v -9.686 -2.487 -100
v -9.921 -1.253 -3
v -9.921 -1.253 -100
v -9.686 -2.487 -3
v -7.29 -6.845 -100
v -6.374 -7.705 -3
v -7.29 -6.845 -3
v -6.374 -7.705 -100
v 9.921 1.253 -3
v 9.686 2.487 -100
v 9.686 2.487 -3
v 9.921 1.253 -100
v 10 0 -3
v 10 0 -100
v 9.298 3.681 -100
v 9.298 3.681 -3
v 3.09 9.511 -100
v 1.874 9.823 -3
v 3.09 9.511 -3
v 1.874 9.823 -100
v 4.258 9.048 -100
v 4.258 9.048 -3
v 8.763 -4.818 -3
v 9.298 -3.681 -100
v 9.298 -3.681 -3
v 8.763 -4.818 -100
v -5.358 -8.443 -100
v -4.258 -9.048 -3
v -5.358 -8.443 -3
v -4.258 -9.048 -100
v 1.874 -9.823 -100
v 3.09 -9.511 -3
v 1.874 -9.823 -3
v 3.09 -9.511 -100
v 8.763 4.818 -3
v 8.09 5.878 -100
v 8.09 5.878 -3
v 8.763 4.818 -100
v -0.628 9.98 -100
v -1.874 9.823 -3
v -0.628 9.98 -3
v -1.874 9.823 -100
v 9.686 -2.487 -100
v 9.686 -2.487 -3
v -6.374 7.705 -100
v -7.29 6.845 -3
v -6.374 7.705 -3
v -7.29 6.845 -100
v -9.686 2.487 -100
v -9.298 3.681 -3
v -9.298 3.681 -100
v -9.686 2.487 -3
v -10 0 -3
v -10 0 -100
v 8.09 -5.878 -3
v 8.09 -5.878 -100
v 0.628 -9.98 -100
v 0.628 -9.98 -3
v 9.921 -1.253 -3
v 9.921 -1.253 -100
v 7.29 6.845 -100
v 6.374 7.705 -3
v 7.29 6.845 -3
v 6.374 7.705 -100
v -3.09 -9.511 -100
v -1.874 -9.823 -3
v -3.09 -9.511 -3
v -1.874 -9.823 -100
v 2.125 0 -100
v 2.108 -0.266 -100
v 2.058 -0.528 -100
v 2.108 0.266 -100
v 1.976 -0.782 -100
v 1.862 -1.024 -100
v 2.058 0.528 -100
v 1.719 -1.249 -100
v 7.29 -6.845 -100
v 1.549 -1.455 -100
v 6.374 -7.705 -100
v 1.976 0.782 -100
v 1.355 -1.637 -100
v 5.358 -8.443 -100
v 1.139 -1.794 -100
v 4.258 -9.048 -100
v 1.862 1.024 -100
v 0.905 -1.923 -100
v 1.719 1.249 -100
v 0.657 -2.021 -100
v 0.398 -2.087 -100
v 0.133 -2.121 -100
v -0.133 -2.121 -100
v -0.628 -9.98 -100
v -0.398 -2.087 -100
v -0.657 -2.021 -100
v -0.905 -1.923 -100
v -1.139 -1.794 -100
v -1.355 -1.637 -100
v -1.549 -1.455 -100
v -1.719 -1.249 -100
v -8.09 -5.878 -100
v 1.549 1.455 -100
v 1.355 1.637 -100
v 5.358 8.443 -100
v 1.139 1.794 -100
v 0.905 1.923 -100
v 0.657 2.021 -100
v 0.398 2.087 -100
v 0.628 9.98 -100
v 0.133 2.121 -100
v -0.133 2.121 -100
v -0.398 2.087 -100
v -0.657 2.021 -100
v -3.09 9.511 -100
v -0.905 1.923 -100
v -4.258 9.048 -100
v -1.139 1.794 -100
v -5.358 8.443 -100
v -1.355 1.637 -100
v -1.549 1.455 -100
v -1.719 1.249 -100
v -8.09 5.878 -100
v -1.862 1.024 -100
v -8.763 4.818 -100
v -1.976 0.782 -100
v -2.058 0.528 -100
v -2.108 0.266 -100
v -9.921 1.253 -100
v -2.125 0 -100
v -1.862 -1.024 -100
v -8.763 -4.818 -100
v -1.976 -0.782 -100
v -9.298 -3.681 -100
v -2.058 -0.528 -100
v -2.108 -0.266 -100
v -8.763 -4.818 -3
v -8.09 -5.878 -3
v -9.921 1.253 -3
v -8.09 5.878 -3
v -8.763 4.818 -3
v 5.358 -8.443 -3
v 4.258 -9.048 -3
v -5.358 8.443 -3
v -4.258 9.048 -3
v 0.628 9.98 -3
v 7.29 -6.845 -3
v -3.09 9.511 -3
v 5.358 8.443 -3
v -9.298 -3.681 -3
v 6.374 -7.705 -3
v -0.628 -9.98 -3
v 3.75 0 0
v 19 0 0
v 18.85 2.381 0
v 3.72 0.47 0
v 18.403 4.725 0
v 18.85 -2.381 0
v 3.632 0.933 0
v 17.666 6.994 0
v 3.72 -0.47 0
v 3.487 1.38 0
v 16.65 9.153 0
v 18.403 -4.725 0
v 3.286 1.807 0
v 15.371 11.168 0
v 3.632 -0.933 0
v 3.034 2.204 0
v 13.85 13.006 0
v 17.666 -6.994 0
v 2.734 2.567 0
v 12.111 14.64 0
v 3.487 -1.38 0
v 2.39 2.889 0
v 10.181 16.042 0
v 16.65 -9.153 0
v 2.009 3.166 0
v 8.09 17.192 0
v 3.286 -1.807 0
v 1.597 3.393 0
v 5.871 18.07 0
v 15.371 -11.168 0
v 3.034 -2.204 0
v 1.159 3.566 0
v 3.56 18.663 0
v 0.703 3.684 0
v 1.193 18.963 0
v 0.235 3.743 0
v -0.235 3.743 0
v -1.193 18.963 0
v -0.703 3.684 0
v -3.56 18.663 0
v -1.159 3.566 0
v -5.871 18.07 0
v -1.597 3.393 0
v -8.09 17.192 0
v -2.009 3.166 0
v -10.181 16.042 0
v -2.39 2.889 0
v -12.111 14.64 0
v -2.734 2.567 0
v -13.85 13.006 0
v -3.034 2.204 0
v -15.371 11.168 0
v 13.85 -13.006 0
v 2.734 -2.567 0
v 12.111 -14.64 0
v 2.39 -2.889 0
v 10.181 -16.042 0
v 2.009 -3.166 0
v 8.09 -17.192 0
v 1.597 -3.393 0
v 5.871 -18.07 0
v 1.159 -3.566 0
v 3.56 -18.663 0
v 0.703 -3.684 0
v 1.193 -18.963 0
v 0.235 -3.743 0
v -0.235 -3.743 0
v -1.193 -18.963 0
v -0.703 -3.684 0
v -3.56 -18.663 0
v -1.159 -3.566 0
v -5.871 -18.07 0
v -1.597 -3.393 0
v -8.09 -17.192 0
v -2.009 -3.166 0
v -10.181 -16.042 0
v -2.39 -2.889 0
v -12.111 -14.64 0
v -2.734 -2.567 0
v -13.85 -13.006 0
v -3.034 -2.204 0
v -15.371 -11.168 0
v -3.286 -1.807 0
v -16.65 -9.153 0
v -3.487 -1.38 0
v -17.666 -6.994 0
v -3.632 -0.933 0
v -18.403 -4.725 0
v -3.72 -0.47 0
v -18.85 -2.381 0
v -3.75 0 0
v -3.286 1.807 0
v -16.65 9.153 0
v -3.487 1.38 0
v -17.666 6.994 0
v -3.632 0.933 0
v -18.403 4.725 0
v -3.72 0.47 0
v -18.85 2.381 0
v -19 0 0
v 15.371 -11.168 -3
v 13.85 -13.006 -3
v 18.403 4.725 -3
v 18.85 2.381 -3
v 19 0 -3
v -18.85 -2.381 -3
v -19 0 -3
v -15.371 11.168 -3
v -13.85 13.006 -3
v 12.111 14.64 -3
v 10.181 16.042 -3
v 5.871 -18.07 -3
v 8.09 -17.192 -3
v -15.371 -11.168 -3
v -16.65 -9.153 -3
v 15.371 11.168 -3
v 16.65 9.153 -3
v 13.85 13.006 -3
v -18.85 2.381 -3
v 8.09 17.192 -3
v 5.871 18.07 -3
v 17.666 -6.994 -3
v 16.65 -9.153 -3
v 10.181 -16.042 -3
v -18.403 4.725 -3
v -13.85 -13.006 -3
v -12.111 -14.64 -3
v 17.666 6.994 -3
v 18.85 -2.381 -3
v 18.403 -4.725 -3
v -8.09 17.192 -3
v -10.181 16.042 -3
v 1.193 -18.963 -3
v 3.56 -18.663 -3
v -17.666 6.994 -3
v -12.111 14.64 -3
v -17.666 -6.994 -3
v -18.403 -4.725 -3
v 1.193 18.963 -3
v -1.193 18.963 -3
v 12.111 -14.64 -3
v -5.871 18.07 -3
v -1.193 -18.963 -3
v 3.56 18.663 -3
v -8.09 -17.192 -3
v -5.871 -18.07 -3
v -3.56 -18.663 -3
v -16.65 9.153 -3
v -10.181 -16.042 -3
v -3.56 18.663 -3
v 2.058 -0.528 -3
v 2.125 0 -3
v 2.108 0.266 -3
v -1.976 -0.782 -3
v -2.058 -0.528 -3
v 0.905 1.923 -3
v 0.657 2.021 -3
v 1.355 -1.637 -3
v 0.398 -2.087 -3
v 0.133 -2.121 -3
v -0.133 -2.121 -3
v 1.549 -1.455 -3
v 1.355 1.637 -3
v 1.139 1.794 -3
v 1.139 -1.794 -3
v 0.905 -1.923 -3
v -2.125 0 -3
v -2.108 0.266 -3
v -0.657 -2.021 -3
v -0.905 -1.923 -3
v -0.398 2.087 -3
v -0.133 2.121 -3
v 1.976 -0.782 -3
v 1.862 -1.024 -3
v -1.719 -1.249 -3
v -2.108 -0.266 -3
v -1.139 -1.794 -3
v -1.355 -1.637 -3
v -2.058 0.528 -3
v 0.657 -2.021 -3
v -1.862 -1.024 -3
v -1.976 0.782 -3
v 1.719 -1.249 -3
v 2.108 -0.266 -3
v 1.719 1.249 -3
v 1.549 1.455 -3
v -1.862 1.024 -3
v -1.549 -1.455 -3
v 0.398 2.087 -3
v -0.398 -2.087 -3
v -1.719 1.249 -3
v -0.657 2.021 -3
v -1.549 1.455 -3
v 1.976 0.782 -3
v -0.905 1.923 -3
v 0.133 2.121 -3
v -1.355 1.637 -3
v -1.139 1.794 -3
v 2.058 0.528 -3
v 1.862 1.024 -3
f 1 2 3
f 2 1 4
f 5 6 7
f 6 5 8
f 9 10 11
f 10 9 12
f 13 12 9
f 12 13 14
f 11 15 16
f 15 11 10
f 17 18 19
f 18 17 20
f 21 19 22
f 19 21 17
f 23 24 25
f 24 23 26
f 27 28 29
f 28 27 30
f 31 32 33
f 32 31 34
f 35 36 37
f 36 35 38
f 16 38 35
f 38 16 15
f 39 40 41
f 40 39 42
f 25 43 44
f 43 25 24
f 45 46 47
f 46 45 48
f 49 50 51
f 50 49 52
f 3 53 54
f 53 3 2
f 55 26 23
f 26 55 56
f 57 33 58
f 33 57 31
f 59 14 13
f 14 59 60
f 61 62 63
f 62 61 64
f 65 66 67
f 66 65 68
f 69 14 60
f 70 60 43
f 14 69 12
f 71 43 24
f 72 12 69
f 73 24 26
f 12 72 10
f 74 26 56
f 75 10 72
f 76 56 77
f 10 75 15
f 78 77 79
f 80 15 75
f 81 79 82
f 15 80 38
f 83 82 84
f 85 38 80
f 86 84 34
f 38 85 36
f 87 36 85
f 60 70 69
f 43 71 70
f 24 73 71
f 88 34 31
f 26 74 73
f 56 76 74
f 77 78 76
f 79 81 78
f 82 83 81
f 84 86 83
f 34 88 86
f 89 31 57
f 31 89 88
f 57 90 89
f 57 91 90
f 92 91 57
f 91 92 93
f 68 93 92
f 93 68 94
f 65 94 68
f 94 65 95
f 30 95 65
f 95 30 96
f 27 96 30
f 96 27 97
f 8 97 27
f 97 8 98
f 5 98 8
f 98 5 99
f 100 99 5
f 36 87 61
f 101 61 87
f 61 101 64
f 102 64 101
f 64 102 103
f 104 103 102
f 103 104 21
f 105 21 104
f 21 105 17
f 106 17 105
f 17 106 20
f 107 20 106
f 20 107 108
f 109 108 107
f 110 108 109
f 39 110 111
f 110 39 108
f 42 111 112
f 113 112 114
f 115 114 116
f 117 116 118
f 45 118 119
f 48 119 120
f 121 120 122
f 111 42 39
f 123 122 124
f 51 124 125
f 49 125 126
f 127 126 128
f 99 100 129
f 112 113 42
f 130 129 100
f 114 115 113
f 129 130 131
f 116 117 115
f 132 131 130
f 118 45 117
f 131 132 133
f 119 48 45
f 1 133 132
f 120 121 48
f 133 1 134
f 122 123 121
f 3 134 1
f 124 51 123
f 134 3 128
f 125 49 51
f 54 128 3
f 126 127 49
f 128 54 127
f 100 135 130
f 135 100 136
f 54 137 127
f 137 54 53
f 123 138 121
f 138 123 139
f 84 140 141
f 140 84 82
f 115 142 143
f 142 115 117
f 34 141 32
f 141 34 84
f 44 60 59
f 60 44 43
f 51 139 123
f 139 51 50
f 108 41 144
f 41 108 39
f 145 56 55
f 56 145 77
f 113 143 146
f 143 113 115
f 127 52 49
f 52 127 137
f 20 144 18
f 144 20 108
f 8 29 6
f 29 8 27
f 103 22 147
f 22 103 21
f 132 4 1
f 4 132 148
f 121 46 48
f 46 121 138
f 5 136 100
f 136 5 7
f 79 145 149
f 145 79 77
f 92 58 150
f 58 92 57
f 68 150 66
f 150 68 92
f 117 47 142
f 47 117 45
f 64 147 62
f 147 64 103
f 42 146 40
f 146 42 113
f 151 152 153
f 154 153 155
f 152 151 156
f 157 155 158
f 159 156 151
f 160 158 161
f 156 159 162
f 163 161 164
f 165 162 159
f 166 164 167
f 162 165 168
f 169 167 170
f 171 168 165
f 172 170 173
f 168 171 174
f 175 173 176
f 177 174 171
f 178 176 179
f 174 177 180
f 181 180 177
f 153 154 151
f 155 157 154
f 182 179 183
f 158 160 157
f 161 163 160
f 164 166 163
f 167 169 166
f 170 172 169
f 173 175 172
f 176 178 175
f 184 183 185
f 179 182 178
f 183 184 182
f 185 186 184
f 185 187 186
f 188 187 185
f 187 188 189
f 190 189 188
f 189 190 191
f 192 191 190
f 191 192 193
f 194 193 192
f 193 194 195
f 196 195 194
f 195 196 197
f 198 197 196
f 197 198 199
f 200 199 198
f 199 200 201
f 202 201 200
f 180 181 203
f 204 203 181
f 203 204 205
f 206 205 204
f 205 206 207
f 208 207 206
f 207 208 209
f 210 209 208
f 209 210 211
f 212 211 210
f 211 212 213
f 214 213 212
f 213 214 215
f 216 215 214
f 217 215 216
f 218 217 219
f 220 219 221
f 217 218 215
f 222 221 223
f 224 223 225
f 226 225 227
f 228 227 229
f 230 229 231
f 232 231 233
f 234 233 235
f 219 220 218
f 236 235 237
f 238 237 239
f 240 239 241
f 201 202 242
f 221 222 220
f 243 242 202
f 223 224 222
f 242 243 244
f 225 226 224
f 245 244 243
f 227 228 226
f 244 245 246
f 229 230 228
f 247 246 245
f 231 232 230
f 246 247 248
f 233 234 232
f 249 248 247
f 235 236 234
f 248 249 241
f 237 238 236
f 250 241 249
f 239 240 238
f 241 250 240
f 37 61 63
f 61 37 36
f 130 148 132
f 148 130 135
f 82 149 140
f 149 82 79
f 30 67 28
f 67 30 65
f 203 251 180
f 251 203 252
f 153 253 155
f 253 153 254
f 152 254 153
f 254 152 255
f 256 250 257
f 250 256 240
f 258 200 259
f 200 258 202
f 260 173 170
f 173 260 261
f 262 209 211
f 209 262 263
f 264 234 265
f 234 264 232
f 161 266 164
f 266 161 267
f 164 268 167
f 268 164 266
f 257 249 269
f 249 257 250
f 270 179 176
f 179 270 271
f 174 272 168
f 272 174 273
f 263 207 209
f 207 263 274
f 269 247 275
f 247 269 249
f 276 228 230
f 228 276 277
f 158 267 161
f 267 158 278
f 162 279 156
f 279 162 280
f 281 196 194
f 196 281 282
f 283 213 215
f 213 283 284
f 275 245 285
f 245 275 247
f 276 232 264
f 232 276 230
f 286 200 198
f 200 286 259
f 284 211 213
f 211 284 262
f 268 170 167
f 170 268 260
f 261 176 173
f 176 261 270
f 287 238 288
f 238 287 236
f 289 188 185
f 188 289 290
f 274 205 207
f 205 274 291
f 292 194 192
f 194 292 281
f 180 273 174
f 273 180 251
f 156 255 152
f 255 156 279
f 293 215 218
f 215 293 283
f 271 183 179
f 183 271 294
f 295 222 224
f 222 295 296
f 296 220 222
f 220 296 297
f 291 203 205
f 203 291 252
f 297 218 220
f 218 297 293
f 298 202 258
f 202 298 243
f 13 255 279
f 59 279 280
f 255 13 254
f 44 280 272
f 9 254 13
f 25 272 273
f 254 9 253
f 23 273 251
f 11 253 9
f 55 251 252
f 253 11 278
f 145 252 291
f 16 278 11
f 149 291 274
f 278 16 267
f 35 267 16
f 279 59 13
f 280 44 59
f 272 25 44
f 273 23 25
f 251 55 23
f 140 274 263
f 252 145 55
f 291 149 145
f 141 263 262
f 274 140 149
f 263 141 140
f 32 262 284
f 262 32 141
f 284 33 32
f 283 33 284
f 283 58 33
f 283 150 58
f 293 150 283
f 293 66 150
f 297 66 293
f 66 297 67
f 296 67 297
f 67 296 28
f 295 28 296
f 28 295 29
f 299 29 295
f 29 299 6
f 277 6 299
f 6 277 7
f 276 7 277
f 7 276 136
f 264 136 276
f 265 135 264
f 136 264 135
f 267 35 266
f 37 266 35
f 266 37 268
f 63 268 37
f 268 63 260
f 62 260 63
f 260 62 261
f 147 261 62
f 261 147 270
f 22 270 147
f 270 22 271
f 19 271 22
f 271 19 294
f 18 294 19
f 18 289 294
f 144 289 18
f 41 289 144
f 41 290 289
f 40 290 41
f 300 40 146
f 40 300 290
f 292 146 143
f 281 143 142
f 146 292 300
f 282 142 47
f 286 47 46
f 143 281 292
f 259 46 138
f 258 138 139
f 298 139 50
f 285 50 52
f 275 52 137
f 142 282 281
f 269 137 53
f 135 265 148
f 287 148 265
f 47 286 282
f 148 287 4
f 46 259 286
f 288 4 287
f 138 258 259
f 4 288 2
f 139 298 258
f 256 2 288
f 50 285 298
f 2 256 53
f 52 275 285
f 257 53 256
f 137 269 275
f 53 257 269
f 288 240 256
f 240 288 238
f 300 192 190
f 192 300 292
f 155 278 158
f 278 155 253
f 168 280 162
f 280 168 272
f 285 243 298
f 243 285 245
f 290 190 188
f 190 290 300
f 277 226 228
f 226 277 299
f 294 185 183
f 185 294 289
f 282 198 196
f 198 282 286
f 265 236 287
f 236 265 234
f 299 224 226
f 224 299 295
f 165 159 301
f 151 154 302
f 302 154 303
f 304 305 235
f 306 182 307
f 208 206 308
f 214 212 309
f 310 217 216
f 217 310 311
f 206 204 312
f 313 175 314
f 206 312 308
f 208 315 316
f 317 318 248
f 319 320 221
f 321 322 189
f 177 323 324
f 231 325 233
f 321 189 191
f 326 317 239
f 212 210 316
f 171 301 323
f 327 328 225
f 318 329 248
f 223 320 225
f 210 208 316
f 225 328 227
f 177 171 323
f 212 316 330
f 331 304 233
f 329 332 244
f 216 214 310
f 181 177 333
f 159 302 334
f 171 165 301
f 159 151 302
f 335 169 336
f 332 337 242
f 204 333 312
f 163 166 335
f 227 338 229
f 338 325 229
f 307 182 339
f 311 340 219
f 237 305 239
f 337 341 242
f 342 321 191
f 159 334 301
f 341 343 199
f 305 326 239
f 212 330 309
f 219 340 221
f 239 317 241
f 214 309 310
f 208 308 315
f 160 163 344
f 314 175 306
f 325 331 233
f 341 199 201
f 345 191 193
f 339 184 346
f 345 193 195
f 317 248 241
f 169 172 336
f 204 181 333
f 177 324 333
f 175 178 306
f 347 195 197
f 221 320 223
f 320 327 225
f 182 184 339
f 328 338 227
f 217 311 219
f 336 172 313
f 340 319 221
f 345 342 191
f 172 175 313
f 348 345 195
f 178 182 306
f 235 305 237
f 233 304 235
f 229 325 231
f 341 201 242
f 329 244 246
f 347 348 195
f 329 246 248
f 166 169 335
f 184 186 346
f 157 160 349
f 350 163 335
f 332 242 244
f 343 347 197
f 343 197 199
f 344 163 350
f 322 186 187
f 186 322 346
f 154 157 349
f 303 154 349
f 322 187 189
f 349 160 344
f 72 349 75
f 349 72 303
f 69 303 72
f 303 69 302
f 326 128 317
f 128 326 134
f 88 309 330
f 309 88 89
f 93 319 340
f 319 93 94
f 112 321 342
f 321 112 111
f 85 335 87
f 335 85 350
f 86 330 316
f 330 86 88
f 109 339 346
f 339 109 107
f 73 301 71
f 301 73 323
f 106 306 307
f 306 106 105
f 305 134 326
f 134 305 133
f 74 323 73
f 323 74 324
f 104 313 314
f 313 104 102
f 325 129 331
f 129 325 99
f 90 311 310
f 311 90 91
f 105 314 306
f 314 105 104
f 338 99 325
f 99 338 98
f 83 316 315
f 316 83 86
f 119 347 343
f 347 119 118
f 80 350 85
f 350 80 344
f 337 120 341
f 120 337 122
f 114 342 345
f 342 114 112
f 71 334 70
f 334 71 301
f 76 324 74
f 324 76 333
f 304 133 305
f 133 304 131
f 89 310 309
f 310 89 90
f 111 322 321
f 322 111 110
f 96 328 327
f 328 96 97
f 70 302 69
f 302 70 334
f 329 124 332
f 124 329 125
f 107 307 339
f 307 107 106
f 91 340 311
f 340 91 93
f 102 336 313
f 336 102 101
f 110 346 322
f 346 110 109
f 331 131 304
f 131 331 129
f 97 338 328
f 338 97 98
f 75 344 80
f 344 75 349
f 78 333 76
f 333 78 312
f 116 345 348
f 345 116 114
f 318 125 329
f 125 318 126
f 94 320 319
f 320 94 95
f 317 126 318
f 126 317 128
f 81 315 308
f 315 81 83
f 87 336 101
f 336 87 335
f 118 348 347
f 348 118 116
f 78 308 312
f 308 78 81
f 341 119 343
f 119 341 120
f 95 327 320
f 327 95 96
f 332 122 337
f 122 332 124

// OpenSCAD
$fn = 50;


difference() {
	union() {
		translate(v = [0, 0, -100.0000000000]) {
			cylinder(h = 100, r = 10.0000000000);
		}
		translate(v = [0, 0, -3.0000000000]) {
			cylinder(h = 3, r = 19.0000000000);
		}
	}
	union() {
		translate(v = [0, 0, 0]) {
			rotate(a = [0, 0, 0]) {
				difference() {
					union() {
						#translate(v = [0, 0, -100.0000000000]) {
							cylinder(h = 100, r = 2.0000000000);
						}
						#translate(v = [0, 0, -3]) {
							cylinder(h = 3, r1 = 2.1250000000, r2 = 3.7500000000);
						}
						#translate(v = [0, 0, -100.0000000000]) {
							cylinder(h = 100, r = 2.1250000000);
						}
						#translate(v = [0, 0, -100.0000000000]) {
							cylinder(h = 100, r = 2.0000000000);
						}
					}
					union();
				}
			}
		}
	}
}
